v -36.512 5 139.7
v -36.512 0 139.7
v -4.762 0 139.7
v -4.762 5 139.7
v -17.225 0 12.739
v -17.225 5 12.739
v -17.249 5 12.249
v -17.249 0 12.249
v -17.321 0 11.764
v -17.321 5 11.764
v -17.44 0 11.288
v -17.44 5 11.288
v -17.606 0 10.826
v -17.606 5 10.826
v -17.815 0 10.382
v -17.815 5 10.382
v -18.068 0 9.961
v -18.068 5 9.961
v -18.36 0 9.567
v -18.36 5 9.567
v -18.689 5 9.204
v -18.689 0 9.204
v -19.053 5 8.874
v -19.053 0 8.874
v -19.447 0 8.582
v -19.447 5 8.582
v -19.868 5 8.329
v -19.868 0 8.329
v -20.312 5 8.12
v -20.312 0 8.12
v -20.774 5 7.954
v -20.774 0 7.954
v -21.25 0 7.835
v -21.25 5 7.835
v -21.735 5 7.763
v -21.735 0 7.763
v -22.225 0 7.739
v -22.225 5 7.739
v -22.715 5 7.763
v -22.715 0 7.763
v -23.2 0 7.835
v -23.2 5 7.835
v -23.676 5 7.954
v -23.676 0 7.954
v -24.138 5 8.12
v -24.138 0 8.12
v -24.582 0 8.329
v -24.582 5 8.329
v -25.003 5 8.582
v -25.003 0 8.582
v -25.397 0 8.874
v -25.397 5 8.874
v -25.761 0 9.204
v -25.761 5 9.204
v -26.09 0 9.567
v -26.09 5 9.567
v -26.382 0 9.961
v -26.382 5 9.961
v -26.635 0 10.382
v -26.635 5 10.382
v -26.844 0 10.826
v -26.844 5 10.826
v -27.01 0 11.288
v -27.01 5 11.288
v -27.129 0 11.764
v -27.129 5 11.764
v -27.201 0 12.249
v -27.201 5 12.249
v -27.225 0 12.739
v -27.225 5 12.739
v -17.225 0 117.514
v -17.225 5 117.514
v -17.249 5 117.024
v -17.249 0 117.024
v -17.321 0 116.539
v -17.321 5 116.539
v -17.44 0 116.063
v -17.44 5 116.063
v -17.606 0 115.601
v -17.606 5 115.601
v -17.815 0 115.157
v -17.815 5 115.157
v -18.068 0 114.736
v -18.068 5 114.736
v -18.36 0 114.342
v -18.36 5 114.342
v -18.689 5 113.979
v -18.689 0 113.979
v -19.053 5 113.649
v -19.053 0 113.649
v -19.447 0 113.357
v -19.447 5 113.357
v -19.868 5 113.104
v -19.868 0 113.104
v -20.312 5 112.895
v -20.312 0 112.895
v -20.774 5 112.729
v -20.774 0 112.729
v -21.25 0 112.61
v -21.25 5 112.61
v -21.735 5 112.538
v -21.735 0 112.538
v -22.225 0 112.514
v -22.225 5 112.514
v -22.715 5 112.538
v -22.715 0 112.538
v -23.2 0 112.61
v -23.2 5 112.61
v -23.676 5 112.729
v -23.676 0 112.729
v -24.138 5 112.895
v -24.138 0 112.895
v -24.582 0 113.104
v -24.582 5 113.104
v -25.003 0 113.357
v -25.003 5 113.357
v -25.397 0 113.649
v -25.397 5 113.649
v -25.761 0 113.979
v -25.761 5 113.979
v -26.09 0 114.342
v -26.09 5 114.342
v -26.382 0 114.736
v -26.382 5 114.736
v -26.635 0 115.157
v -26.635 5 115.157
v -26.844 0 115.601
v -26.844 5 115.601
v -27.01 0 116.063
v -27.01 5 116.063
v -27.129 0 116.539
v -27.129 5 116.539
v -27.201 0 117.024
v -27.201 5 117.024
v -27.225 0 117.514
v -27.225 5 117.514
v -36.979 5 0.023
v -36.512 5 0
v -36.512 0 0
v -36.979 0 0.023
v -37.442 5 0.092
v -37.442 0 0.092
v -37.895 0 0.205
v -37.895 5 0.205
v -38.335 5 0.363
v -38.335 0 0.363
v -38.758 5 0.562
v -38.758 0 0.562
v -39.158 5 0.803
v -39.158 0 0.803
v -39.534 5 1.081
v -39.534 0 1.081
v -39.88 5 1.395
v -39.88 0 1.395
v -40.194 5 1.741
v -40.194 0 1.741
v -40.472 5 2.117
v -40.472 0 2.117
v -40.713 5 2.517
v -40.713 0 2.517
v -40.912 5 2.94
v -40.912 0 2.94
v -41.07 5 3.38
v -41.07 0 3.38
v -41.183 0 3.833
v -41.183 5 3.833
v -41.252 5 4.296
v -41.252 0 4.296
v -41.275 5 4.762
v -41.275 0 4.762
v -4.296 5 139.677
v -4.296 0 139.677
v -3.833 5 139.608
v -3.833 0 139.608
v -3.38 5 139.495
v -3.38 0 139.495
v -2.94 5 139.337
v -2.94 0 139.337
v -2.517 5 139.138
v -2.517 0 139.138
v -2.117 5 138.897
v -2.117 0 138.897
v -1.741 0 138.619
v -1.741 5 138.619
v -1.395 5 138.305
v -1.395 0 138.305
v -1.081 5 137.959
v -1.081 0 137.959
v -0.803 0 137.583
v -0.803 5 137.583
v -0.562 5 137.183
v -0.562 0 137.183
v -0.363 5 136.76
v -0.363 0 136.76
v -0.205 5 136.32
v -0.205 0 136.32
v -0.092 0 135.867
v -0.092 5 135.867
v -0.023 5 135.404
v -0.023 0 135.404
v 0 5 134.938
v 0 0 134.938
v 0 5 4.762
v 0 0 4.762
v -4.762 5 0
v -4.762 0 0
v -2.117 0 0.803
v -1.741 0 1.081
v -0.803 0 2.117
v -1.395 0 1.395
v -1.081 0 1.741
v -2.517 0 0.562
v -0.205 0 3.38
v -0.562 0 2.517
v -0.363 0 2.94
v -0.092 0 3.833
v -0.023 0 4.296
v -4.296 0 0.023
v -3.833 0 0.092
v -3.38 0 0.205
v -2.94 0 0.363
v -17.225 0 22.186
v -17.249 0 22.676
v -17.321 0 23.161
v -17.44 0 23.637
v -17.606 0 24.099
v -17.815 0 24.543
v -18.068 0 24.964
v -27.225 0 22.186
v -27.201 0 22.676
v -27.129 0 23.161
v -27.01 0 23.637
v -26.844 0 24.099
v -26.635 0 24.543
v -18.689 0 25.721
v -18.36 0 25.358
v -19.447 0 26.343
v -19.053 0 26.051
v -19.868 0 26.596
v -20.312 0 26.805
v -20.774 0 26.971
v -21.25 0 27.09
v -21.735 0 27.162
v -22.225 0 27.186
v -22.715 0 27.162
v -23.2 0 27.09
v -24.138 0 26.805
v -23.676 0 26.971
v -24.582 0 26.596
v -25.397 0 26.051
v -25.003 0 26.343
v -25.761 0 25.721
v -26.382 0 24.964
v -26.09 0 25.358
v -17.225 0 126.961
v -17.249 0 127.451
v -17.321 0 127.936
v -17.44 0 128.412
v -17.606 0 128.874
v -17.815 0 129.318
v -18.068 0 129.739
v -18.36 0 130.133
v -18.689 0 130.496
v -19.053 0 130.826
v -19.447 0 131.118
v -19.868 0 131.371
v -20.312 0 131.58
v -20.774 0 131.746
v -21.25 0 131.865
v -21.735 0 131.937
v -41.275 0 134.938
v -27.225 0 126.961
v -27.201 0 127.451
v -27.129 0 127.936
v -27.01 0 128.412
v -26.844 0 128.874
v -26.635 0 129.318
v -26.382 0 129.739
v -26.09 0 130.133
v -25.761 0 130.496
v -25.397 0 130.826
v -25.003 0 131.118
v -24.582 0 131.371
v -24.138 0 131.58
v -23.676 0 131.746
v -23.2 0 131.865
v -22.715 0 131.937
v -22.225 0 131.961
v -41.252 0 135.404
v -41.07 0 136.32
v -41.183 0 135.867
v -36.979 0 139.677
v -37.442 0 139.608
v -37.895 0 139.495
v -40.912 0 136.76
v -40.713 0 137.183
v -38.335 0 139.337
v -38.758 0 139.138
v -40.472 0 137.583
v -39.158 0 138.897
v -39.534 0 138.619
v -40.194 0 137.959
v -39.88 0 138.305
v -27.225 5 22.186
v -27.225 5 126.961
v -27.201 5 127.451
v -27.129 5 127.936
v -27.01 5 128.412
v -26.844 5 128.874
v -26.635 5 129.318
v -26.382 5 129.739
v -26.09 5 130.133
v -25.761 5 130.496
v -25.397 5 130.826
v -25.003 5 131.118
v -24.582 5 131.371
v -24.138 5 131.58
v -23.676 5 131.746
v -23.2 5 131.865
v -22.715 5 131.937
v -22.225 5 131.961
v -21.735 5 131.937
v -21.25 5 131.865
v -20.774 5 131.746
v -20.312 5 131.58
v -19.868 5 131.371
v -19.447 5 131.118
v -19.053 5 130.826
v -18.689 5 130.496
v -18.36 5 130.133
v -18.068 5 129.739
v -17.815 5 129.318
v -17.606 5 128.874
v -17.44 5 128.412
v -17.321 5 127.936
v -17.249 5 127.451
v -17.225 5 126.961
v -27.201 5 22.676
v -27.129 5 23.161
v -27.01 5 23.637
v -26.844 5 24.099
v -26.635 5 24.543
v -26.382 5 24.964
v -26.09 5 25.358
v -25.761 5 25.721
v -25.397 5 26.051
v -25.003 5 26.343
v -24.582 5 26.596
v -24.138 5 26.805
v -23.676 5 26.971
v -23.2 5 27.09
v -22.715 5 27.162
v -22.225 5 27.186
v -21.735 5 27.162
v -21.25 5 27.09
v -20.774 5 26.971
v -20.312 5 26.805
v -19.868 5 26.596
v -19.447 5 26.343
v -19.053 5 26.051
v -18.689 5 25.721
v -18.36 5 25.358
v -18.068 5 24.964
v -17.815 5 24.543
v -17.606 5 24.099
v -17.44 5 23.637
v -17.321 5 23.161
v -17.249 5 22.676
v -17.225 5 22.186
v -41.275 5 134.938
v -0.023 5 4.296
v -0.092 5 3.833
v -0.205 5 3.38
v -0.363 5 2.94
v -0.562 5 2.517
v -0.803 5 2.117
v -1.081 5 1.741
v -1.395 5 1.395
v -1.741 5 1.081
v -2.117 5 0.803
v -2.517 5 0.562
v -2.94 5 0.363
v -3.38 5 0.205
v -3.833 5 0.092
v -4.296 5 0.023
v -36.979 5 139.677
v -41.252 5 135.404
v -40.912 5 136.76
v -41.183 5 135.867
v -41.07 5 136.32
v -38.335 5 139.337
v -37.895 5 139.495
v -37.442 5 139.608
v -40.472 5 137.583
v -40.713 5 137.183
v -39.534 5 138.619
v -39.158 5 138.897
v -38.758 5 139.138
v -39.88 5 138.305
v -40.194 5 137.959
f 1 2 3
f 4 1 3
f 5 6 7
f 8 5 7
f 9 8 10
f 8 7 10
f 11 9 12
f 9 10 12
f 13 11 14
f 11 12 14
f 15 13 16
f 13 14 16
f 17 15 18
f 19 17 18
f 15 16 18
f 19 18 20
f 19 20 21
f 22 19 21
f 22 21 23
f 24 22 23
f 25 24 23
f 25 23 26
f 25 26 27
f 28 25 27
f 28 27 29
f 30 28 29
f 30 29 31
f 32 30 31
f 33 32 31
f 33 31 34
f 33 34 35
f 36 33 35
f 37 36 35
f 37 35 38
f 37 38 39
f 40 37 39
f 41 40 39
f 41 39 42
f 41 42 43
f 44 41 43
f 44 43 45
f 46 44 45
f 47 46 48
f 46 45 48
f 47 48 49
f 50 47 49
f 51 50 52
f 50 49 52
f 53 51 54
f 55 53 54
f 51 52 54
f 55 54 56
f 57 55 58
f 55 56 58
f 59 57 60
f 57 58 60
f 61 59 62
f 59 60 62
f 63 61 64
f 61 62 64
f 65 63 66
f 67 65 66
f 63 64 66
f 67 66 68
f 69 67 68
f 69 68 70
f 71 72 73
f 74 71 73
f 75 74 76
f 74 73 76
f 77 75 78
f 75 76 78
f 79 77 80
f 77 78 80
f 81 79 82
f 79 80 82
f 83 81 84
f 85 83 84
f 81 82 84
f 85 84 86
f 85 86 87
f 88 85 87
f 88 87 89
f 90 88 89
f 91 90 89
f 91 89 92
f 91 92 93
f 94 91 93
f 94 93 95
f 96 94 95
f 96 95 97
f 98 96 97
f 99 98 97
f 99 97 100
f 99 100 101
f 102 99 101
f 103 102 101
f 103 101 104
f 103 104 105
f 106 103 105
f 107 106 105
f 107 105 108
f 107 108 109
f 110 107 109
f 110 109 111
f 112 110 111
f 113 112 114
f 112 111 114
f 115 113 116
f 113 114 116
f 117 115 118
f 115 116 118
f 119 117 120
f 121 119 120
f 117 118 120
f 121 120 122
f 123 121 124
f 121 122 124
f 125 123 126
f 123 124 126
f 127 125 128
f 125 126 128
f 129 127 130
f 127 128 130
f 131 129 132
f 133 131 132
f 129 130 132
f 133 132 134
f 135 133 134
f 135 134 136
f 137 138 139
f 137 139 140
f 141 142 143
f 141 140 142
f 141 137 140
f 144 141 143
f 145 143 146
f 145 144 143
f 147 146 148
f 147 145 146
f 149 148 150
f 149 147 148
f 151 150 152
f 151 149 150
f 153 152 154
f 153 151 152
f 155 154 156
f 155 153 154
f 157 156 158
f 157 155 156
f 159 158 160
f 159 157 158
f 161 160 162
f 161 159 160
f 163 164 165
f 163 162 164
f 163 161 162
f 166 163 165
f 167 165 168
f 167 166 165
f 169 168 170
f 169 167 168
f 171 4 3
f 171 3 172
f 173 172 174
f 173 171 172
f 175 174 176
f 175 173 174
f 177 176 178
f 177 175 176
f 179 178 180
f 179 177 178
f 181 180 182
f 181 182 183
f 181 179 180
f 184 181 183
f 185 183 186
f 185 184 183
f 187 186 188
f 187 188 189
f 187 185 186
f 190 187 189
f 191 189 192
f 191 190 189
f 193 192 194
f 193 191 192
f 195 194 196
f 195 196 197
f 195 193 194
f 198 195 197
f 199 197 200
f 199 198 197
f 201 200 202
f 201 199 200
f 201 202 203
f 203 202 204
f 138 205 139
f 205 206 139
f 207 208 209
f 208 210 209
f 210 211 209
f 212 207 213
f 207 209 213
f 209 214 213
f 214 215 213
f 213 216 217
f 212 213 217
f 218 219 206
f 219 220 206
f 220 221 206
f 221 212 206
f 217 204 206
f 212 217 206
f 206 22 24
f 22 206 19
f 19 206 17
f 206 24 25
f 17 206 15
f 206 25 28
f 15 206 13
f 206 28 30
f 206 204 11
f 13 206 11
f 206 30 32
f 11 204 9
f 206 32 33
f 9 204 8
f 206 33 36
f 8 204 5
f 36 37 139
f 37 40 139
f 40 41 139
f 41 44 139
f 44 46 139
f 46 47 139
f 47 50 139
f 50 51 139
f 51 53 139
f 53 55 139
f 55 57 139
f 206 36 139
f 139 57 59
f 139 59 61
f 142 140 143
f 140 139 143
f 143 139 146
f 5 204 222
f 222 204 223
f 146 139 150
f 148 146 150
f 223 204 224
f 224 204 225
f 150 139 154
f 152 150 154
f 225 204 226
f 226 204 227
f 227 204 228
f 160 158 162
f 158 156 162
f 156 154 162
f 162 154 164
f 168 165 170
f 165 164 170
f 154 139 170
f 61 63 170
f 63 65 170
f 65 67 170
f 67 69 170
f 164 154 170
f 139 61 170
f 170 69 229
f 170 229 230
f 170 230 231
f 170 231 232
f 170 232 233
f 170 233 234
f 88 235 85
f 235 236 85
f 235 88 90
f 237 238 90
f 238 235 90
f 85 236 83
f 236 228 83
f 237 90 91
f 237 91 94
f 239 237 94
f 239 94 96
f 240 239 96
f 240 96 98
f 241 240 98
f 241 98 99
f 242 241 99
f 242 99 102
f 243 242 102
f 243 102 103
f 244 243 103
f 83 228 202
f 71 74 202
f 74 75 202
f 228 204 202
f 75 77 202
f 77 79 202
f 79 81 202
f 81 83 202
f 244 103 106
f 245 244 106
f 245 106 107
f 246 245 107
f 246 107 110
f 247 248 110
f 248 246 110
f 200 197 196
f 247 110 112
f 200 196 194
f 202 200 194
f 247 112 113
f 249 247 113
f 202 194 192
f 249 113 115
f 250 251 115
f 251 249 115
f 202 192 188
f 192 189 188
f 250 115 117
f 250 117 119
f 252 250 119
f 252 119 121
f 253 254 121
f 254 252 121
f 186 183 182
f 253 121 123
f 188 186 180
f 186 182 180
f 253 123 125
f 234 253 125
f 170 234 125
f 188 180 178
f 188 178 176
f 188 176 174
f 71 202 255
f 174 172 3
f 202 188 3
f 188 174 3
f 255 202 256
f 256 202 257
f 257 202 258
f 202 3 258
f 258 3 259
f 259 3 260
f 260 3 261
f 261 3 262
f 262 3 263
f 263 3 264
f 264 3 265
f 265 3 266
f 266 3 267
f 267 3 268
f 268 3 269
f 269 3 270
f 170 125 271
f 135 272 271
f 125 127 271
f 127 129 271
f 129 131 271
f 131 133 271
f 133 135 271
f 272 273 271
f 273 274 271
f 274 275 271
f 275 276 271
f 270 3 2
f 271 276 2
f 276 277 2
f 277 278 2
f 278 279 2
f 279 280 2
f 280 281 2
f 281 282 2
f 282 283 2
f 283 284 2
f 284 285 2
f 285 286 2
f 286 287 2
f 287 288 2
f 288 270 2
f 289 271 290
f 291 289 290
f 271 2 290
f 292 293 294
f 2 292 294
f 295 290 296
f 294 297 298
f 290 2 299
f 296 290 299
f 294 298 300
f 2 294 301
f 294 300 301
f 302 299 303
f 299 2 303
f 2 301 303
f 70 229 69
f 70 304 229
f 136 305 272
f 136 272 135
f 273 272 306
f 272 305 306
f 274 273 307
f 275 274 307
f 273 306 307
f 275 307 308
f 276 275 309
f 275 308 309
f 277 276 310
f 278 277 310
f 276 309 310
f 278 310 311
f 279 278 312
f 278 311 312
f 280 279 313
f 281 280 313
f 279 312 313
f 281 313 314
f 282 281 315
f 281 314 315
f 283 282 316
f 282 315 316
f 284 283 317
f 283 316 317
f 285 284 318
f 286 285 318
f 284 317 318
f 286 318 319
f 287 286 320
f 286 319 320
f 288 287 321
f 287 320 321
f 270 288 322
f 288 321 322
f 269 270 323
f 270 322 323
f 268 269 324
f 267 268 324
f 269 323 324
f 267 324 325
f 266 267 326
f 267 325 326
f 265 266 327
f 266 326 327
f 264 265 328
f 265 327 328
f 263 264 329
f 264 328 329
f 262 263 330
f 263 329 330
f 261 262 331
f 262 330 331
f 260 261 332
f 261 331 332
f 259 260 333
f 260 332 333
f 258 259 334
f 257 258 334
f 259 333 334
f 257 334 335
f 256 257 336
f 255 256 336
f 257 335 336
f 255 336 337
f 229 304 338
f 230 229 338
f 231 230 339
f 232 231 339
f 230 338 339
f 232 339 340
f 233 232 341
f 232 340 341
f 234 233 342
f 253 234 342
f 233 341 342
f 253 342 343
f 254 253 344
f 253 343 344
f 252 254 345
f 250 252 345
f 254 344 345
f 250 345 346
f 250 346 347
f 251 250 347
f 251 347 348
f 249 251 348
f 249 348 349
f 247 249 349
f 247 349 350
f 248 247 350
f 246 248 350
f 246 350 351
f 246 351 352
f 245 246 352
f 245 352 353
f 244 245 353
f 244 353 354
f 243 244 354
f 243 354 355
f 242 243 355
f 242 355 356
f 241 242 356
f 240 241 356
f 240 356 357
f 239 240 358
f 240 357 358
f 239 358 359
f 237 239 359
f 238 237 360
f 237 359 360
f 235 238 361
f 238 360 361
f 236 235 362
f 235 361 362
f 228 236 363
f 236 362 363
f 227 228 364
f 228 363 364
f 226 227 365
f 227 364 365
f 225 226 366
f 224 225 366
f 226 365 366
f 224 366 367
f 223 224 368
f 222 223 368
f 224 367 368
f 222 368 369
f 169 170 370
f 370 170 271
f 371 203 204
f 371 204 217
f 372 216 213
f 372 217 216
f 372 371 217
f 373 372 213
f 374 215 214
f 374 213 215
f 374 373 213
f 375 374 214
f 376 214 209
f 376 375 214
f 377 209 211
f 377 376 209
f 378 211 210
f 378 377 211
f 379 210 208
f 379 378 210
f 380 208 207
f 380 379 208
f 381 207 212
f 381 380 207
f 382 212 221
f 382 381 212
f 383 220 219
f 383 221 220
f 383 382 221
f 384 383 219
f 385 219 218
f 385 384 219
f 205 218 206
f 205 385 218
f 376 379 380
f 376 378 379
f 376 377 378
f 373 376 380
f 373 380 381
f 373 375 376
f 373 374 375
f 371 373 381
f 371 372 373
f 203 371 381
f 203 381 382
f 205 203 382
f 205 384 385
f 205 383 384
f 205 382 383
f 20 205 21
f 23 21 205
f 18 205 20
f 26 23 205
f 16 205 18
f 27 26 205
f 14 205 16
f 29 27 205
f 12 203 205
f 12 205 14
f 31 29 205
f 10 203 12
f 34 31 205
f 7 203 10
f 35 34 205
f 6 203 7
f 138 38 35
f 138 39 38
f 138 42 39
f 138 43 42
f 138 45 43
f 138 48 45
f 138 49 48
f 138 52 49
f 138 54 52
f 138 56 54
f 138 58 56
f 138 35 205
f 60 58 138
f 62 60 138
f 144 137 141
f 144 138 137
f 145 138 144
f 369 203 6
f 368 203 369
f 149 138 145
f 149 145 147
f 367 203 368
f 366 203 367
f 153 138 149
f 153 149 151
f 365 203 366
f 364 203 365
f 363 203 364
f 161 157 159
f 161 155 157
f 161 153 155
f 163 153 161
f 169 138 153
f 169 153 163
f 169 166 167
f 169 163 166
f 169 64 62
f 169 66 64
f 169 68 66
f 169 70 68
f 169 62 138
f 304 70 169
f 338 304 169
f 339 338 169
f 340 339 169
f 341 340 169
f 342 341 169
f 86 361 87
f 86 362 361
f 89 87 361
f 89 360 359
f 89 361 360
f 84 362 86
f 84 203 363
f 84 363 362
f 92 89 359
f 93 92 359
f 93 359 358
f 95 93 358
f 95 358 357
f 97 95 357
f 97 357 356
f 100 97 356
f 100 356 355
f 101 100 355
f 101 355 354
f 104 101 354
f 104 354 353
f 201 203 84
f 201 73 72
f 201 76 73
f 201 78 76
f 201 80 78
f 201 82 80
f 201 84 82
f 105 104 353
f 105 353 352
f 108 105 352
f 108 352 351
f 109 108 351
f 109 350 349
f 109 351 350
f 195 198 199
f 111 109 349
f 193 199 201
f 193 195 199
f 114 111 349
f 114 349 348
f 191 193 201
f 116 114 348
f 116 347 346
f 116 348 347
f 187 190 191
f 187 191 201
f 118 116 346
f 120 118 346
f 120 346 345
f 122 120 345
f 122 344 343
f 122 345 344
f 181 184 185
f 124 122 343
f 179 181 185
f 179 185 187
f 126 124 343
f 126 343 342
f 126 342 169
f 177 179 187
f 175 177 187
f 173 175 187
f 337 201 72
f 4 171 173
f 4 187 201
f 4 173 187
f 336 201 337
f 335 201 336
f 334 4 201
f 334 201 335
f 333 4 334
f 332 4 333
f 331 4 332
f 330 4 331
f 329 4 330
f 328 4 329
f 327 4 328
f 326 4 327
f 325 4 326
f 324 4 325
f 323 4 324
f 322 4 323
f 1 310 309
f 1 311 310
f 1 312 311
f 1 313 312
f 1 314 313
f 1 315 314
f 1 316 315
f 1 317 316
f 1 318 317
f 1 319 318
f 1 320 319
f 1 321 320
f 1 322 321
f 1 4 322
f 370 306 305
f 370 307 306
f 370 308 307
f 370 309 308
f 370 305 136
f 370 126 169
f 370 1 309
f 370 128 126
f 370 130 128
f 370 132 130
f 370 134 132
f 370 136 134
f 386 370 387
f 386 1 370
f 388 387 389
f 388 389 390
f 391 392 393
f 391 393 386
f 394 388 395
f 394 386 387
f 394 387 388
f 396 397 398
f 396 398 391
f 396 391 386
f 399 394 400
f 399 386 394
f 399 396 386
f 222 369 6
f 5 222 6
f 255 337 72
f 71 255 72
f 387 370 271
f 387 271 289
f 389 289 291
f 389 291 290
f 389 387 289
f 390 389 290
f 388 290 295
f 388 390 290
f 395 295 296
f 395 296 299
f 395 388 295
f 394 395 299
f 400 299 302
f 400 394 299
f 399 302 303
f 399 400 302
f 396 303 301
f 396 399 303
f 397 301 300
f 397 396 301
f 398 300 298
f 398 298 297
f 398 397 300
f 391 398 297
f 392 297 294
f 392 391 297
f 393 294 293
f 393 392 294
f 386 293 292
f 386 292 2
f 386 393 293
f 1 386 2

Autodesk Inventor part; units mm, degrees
ref_plane "YZ Plane" through (0, 0, 0) normal (1, 0, 0) x (0, 1, 0)
ref_plane "XZ Plane" through (0, 0, 0) normal (0, 1, 0) x (-1, 0, 0)
ref_plane "XY Plane" through (0, 0, 0) normal (0, 0, 1) x (1, 0, 0)
sketch "Boceto1" plane through (0, 0, 0) normal (0, 1, 0) x (-1, 0, 0)
  line L0 (41.275, 139.7) -> (0, 139.7)
  line L1 (0, 139.7) -> (0, 0)
  line L2 (0, 0) -> (41.275, 0)
  line L3 (41.275, 0) -> (41.275, 139.7)
  dimension "d0" = 139.7
  dimension "d1" = 41.275
extrude "Extrusión1" add sketch "Boceto1" along normal blind 5
sketch "Boceto2" plane through (0, 5, 0) normal (0, 1, 0) x (1, 0, 0)
  circle A0 centre (-22.225, -122.2375) radius 5
  line L0 (-41.275, -139.7) -> (0, -139.7) projected
  circle A1 centre (-22.225, -126.9609) radius 5
  circle A2 centre (-22.225, -117.5141) radius 5
  line L1 (-22.225, -126.9609) -> (-22.225, -122.2375)
  line L2 (-22.225, -122.2375) -> (-22.225, -117.5141)
  line L3 (-41.275, -139.7) -> (-41.275, 0) projected
  line L4 (-17.225, -126.9609) -> (-17.225, -117.5141)
  line L5 (-27.225, -126.9609) -> (-27.225, -117.5141)
  circle A3 centre (-22.225, -17.4625) radius 5
  circle A4 centre (-22.225, -22.1859) radius 5
  circle A5 centre (-22.225, -12.7391) radius 5
  line L6 (-22.225, -22.1859) -> (-22.225, -17.4625)
  line L7 (-22.225, -17.4625) -> (-22.225, -12.7391)
  line L8 (0, 0) -> (-41.275, 0) projected
  line L9 (-27.225, -22.1859) -> (-27.225, -12.7391)
  line L10 (-17.225, -22.1859) -> (-17.225, -12.7391)
  dimension "d4" = 10
  dimension "d5" = 17.4625
  dimension "d6" = 10
  dimension "d7" = 10
  dimension "d8" = 19.4469
  dimension "d9" = 19.05
  dimension "d10" = 10
  dimension "d11" = 10
  dimension "d12" = 10
  dimension "d13" = 19.4469
  dimension "d14" = 19.05
  dimension "d15" = 17.4625
extrude "Extrusión2" cut sketch "Boceto2" against normal up to next
fillet "Empalme1" radius 4.7625 4 edges at (0, 2.5, 139.7) (-41.275, 2.5, 139.7) (0, 2.5, 0) (-41.275, 2.5, 0)
properties part number "CAR LATERAL BEARING HOLDER"
